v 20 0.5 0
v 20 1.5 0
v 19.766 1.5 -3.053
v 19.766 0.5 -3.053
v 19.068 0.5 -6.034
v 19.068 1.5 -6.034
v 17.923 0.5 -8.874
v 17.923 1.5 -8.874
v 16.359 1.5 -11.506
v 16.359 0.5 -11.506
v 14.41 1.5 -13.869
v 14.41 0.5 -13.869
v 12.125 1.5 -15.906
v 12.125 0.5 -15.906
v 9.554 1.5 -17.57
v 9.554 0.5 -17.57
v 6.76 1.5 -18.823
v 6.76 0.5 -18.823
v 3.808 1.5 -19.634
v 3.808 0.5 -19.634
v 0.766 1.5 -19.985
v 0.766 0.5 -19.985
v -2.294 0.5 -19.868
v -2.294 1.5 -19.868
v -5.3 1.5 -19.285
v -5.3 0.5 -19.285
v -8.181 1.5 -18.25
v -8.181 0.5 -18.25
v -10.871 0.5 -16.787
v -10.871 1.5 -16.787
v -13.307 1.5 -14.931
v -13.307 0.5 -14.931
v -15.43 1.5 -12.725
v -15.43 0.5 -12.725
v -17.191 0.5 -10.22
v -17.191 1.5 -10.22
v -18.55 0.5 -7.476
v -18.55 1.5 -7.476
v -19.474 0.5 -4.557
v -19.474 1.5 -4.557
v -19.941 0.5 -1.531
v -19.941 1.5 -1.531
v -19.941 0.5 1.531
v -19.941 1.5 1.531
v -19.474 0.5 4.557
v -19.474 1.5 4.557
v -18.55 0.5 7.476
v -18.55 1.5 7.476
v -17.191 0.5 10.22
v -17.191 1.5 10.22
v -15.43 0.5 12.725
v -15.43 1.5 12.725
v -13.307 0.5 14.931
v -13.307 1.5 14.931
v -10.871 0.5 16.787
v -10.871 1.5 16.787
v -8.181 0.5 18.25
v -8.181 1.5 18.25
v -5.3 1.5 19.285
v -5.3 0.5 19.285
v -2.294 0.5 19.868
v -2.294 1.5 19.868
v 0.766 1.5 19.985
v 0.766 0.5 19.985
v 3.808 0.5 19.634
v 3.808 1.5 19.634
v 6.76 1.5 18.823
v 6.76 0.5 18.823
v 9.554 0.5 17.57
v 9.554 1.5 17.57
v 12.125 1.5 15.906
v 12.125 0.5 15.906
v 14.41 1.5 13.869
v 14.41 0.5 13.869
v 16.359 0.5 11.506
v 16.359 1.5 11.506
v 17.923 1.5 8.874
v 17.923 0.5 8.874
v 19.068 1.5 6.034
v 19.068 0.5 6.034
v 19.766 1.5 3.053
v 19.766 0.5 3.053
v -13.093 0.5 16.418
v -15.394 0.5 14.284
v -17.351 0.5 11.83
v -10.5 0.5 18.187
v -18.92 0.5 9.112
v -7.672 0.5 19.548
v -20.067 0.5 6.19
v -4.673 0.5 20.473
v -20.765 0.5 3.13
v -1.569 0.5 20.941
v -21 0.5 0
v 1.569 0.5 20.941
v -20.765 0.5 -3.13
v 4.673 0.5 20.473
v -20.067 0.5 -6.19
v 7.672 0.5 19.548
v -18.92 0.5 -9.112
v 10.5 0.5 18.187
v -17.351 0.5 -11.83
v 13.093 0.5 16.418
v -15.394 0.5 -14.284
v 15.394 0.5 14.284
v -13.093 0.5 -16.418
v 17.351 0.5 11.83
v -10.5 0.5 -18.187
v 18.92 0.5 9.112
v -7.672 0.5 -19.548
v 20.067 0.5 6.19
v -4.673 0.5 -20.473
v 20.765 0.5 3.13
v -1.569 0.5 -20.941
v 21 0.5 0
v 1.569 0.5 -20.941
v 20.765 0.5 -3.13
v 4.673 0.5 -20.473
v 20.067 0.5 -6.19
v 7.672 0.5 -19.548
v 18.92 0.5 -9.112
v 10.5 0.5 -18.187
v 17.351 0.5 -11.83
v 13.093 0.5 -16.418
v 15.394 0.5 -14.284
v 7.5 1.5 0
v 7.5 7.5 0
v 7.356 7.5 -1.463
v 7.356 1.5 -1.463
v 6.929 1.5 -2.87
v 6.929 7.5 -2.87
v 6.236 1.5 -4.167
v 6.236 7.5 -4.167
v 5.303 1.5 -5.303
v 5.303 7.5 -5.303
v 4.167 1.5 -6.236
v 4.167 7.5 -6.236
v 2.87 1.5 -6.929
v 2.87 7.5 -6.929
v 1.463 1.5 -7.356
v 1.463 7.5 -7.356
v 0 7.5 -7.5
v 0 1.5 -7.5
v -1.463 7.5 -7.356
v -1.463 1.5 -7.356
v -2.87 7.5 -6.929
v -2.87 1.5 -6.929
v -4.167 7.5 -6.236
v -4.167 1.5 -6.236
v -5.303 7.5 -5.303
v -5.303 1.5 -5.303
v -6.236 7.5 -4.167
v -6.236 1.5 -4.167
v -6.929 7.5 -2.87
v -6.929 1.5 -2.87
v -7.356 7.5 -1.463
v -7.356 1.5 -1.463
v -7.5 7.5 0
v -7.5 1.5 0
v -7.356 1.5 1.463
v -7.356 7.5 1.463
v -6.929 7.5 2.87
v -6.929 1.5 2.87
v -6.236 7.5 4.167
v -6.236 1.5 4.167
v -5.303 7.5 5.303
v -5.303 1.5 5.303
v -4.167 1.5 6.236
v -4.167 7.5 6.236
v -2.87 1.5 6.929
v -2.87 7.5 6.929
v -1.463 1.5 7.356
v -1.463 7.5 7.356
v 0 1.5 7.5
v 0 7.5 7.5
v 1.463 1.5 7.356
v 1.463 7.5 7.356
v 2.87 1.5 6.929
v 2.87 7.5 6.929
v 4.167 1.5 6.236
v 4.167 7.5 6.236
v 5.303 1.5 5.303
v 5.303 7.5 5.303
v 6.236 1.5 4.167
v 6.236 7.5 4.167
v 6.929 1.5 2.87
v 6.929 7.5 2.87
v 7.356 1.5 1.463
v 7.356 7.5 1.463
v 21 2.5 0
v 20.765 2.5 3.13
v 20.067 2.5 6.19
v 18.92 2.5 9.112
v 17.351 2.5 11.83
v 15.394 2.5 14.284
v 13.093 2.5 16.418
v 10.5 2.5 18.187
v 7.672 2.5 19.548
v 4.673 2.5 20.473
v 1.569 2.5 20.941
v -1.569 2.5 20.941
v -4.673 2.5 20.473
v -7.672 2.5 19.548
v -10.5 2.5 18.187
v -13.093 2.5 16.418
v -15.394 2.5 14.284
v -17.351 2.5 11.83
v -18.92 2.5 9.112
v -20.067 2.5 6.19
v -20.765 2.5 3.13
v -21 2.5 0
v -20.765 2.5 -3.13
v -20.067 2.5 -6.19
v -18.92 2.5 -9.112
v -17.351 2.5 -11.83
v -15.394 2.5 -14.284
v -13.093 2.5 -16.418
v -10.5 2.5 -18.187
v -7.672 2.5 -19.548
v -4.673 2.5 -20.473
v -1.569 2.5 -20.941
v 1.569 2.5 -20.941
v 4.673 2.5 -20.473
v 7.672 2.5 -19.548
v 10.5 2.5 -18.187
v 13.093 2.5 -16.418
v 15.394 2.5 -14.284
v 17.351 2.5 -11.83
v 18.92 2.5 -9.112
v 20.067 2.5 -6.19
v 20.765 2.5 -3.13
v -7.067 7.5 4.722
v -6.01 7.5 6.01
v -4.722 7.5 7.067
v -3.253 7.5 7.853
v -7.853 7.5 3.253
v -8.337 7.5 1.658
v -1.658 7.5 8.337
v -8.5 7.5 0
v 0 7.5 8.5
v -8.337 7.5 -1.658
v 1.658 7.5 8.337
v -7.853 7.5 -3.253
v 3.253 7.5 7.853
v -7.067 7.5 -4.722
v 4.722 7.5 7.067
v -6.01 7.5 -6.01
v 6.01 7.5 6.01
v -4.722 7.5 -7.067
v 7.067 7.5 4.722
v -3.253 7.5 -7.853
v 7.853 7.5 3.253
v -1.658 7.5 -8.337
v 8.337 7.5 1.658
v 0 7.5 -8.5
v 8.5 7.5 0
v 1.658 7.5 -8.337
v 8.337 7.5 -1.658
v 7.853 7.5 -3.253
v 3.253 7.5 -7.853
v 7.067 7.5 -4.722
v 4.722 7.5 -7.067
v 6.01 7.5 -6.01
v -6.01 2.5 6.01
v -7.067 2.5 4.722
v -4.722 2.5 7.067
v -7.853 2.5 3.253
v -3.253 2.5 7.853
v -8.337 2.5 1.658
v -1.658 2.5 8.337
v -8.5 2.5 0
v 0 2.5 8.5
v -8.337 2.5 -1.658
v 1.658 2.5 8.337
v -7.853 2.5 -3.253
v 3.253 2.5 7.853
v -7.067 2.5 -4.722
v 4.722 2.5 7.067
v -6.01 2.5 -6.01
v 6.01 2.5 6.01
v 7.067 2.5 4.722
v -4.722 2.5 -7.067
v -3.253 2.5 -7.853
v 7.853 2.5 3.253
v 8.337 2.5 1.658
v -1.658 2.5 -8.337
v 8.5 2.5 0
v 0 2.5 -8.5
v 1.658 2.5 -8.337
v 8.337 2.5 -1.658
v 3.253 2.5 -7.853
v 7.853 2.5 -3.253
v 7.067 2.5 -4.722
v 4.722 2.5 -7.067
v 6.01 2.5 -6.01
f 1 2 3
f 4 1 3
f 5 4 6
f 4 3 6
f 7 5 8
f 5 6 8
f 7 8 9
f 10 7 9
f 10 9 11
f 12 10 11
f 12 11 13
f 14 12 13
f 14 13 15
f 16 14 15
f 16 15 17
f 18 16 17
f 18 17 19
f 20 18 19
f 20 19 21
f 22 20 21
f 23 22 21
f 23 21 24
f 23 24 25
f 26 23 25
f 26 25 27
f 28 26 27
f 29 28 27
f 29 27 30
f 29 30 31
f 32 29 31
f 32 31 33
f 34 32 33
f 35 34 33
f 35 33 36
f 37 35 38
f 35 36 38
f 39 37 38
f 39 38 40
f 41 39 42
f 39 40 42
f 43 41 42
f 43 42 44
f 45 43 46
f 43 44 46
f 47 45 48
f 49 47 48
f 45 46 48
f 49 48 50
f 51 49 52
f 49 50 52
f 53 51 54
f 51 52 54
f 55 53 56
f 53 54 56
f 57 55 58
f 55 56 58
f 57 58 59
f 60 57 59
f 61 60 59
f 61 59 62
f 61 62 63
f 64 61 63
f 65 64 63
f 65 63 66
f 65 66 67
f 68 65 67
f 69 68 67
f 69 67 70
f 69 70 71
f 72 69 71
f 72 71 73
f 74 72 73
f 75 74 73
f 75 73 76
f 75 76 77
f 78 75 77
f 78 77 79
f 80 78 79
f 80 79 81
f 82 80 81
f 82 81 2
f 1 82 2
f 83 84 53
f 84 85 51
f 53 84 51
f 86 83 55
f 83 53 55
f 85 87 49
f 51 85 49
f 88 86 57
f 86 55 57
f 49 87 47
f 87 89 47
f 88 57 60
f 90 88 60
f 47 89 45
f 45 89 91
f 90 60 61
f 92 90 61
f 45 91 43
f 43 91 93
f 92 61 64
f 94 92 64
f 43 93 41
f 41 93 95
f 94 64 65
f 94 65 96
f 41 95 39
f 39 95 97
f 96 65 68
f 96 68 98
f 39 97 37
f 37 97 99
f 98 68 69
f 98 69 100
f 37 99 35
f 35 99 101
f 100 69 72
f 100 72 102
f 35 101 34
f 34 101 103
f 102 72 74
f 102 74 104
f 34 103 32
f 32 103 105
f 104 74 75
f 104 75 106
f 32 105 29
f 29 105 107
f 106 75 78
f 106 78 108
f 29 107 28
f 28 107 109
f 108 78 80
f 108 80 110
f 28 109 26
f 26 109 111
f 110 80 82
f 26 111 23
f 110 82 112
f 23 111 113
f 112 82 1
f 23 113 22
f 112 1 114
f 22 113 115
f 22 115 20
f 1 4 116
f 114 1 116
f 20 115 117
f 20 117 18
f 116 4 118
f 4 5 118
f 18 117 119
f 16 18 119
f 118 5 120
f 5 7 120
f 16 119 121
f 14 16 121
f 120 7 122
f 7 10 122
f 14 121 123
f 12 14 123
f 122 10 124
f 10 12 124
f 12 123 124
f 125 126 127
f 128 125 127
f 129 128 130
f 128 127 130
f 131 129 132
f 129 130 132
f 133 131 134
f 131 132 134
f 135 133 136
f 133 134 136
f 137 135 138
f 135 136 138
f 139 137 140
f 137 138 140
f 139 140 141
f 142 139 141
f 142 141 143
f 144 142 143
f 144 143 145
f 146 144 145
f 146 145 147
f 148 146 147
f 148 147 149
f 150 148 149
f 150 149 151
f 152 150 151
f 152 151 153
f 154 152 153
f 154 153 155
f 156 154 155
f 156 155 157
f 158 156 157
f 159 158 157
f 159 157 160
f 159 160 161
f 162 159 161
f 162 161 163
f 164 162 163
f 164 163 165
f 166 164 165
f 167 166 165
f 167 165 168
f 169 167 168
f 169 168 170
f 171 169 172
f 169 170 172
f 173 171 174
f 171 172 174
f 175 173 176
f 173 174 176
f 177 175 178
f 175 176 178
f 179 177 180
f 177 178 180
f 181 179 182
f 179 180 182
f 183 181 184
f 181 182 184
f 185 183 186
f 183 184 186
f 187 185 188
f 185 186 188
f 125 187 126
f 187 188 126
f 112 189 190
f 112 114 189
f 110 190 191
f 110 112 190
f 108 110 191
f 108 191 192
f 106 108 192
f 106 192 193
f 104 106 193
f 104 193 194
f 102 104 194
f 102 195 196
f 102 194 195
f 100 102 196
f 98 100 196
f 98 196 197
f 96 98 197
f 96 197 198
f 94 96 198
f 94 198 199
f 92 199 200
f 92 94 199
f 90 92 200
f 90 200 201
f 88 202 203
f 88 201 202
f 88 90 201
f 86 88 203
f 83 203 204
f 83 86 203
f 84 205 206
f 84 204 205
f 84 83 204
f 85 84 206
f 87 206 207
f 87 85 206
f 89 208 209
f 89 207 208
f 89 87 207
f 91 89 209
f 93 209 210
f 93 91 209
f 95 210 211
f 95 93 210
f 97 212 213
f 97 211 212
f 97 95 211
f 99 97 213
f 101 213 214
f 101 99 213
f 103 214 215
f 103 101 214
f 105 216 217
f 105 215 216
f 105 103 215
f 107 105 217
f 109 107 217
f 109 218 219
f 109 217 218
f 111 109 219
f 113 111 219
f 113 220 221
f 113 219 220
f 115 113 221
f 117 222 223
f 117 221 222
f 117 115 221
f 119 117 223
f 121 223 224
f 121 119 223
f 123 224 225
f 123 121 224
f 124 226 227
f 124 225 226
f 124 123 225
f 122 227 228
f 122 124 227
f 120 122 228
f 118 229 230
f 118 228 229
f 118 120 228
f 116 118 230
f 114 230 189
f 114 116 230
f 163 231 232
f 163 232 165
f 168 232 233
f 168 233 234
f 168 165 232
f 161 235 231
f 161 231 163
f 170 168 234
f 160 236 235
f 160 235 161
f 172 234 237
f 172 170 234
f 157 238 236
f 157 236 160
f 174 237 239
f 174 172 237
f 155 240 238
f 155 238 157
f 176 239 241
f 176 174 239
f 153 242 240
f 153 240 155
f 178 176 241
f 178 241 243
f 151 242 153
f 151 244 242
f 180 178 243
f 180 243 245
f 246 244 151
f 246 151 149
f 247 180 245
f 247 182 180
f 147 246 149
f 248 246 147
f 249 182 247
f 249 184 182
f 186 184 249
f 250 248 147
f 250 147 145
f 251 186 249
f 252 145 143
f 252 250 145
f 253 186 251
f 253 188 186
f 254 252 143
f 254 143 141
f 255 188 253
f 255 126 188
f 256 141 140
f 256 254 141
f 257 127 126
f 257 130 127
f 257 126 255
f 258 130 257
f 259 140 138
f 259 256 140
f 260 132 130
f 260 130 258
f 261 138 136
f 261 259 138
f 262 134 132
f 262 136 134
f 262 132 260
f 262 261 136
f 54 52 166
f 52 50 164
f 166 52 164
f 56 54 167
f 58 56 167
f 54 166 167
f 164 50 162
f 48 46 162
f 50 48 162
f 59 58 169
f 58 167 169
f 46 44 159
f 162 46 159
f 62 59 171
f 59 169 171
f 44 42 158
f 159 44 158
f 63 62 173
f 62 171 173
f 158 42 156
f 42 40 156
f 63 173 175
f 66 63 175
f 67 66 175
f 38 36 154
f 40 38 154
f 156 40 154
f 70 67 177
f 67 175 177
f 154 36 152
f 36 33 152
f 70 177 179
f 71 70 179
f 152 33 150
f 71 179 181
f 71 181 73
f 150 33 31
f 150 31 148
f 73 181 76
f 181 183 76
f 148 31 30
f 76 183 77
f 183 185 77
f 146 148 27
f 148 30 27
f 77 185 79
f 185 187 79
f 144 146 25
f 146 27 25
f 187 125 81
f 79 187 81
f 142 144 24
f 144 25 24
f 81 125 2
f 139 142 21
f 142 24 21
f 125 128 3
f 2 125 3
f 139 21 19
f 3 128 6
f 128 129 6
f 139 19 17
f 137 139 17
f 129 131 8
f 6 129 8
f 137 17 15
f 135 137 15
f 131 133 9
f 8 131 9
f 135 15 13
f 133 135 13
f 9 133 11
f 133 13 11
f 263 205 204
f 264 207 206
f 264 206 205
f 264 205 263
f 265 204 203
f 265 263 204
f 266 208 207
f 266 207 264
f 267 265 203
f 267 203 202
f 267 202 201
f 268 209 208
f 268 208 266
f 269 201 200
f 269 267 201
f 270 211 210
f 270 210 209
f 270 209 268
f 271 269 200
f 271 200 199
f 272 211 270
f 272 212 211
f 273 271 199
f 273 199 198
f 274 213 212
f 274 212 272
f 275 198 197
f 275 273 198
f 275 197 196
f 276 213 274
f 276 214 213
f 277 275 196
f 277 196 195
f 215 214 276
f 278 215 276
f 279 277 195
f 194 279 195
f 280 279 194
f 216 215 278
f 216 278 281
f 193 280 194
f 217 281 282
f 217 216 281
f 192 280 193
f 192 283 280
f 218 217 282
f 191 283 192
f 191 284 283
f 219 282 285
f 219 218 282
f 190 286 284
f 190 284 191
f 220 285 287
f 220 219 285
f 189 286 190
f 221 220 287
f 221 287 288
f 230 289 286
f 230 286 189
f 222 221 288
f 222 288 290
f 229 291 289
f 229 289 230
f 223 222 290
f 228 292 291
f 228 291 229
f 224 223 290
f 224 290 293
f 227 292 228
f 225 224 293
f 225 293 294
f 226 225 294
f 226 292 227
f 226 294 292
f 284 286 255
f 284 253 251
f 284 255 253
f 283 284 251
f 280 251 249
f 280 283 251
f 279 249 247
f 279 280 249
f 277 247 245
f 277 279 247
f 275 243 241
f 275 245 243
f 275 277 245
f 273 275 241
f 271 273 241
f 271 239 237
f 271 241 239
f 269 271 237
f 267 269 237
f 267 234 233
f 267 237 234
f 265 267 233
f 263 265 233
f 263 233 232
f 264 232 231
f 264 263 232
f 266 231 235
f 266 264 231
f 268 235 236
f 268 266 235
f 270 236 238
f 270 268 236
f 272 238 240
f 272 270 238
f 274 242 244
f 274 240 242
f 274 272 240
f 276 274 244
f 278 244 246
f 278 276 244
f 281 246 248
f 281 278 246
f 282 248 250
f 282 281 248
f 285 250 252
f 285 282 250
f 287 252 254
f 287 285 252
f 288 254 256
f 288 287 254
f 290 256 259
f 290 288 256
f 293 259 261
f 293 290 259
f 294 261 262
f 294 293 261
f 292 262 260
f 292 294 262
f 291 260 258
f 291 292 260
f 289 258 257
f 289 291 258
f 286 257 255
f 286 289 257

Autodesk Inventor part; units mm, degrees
ref_plane "YZ Plane" through (0, 0, 0) normal (1, 0, 0) x (0, 1, 0)
ref_plane "XZ Plane" through (0, 0, 0) normal (0, 1, 0) x (-1, 0, 0)
ref_plane "XY Plane" through (0, 0, 0) normal (0, 0, 1) x (1, 0, 0)
sketch "Sketch1" plane through (0, 0, 0) normal (0, 0, 1) x (1, 0, 0)
  line L0 (0, 0) -> (1.5, 0) construction
  line L1 (1.5, 0) -> (1.5, 1.5) construction
  line L2 (1.5, 1.5) -> (0, 1.5) construction
  line L3 (0, 0) -> (20, 0) construction
  line L4 (20, 0) -> (20, 1.5)
  line L5 (0, 0) -> (14.5, 0) construction
  line L6 (20, 1.5) -> (7.5, 1.5)
  line L7 (0, 1.5) -> (8.5, 1.5) construction
  line L8 (0, -1.5) -> (0, 9) construction
  line L9 (7.5, 1.5) -> (7.5, 7.5)
  line L10 (7.5, 7.5) -> (8.5, 7.5)
  line L11 (8.5, 7.5) -> (8.5, 2.5)
  line L12 (8.5, 2.5) -> (21, 2.5)
  line L13 (21, 2.5) -> (21, 0)
  line L14 (21, 0) -> (20, 0)
  line L15 (20, 0) -> (21, 0)
  line L16 (21, 0) -> (21, 0.5)
  line L17 (21, 0.5) -> (20, 0.5)
  line L18 (20, 0.5) -> (20, 0)
  dimension "d0" = 1.5
  dimension "d1" = 1.5
  dimension "d2" = 20
  dimension "d3" = 1.5
  dimension "d4" = 14.5
  dimension "d6" = 8.5
  dimension "d7" = 1
  dimension "d8" = 6
  dimension "d9" = 1
  dimension "d10" = 1
  dimension "d11" = 1
  dimension "d13" = 0.5
revolve "Revolution2" add sketch "Sketch1" angle 360 about axis through (0, -10, 0) along (0, 1, 0) contours L4 L6 L9 L10 L11 L12 L13 L17
properties part number "Seal_M"
